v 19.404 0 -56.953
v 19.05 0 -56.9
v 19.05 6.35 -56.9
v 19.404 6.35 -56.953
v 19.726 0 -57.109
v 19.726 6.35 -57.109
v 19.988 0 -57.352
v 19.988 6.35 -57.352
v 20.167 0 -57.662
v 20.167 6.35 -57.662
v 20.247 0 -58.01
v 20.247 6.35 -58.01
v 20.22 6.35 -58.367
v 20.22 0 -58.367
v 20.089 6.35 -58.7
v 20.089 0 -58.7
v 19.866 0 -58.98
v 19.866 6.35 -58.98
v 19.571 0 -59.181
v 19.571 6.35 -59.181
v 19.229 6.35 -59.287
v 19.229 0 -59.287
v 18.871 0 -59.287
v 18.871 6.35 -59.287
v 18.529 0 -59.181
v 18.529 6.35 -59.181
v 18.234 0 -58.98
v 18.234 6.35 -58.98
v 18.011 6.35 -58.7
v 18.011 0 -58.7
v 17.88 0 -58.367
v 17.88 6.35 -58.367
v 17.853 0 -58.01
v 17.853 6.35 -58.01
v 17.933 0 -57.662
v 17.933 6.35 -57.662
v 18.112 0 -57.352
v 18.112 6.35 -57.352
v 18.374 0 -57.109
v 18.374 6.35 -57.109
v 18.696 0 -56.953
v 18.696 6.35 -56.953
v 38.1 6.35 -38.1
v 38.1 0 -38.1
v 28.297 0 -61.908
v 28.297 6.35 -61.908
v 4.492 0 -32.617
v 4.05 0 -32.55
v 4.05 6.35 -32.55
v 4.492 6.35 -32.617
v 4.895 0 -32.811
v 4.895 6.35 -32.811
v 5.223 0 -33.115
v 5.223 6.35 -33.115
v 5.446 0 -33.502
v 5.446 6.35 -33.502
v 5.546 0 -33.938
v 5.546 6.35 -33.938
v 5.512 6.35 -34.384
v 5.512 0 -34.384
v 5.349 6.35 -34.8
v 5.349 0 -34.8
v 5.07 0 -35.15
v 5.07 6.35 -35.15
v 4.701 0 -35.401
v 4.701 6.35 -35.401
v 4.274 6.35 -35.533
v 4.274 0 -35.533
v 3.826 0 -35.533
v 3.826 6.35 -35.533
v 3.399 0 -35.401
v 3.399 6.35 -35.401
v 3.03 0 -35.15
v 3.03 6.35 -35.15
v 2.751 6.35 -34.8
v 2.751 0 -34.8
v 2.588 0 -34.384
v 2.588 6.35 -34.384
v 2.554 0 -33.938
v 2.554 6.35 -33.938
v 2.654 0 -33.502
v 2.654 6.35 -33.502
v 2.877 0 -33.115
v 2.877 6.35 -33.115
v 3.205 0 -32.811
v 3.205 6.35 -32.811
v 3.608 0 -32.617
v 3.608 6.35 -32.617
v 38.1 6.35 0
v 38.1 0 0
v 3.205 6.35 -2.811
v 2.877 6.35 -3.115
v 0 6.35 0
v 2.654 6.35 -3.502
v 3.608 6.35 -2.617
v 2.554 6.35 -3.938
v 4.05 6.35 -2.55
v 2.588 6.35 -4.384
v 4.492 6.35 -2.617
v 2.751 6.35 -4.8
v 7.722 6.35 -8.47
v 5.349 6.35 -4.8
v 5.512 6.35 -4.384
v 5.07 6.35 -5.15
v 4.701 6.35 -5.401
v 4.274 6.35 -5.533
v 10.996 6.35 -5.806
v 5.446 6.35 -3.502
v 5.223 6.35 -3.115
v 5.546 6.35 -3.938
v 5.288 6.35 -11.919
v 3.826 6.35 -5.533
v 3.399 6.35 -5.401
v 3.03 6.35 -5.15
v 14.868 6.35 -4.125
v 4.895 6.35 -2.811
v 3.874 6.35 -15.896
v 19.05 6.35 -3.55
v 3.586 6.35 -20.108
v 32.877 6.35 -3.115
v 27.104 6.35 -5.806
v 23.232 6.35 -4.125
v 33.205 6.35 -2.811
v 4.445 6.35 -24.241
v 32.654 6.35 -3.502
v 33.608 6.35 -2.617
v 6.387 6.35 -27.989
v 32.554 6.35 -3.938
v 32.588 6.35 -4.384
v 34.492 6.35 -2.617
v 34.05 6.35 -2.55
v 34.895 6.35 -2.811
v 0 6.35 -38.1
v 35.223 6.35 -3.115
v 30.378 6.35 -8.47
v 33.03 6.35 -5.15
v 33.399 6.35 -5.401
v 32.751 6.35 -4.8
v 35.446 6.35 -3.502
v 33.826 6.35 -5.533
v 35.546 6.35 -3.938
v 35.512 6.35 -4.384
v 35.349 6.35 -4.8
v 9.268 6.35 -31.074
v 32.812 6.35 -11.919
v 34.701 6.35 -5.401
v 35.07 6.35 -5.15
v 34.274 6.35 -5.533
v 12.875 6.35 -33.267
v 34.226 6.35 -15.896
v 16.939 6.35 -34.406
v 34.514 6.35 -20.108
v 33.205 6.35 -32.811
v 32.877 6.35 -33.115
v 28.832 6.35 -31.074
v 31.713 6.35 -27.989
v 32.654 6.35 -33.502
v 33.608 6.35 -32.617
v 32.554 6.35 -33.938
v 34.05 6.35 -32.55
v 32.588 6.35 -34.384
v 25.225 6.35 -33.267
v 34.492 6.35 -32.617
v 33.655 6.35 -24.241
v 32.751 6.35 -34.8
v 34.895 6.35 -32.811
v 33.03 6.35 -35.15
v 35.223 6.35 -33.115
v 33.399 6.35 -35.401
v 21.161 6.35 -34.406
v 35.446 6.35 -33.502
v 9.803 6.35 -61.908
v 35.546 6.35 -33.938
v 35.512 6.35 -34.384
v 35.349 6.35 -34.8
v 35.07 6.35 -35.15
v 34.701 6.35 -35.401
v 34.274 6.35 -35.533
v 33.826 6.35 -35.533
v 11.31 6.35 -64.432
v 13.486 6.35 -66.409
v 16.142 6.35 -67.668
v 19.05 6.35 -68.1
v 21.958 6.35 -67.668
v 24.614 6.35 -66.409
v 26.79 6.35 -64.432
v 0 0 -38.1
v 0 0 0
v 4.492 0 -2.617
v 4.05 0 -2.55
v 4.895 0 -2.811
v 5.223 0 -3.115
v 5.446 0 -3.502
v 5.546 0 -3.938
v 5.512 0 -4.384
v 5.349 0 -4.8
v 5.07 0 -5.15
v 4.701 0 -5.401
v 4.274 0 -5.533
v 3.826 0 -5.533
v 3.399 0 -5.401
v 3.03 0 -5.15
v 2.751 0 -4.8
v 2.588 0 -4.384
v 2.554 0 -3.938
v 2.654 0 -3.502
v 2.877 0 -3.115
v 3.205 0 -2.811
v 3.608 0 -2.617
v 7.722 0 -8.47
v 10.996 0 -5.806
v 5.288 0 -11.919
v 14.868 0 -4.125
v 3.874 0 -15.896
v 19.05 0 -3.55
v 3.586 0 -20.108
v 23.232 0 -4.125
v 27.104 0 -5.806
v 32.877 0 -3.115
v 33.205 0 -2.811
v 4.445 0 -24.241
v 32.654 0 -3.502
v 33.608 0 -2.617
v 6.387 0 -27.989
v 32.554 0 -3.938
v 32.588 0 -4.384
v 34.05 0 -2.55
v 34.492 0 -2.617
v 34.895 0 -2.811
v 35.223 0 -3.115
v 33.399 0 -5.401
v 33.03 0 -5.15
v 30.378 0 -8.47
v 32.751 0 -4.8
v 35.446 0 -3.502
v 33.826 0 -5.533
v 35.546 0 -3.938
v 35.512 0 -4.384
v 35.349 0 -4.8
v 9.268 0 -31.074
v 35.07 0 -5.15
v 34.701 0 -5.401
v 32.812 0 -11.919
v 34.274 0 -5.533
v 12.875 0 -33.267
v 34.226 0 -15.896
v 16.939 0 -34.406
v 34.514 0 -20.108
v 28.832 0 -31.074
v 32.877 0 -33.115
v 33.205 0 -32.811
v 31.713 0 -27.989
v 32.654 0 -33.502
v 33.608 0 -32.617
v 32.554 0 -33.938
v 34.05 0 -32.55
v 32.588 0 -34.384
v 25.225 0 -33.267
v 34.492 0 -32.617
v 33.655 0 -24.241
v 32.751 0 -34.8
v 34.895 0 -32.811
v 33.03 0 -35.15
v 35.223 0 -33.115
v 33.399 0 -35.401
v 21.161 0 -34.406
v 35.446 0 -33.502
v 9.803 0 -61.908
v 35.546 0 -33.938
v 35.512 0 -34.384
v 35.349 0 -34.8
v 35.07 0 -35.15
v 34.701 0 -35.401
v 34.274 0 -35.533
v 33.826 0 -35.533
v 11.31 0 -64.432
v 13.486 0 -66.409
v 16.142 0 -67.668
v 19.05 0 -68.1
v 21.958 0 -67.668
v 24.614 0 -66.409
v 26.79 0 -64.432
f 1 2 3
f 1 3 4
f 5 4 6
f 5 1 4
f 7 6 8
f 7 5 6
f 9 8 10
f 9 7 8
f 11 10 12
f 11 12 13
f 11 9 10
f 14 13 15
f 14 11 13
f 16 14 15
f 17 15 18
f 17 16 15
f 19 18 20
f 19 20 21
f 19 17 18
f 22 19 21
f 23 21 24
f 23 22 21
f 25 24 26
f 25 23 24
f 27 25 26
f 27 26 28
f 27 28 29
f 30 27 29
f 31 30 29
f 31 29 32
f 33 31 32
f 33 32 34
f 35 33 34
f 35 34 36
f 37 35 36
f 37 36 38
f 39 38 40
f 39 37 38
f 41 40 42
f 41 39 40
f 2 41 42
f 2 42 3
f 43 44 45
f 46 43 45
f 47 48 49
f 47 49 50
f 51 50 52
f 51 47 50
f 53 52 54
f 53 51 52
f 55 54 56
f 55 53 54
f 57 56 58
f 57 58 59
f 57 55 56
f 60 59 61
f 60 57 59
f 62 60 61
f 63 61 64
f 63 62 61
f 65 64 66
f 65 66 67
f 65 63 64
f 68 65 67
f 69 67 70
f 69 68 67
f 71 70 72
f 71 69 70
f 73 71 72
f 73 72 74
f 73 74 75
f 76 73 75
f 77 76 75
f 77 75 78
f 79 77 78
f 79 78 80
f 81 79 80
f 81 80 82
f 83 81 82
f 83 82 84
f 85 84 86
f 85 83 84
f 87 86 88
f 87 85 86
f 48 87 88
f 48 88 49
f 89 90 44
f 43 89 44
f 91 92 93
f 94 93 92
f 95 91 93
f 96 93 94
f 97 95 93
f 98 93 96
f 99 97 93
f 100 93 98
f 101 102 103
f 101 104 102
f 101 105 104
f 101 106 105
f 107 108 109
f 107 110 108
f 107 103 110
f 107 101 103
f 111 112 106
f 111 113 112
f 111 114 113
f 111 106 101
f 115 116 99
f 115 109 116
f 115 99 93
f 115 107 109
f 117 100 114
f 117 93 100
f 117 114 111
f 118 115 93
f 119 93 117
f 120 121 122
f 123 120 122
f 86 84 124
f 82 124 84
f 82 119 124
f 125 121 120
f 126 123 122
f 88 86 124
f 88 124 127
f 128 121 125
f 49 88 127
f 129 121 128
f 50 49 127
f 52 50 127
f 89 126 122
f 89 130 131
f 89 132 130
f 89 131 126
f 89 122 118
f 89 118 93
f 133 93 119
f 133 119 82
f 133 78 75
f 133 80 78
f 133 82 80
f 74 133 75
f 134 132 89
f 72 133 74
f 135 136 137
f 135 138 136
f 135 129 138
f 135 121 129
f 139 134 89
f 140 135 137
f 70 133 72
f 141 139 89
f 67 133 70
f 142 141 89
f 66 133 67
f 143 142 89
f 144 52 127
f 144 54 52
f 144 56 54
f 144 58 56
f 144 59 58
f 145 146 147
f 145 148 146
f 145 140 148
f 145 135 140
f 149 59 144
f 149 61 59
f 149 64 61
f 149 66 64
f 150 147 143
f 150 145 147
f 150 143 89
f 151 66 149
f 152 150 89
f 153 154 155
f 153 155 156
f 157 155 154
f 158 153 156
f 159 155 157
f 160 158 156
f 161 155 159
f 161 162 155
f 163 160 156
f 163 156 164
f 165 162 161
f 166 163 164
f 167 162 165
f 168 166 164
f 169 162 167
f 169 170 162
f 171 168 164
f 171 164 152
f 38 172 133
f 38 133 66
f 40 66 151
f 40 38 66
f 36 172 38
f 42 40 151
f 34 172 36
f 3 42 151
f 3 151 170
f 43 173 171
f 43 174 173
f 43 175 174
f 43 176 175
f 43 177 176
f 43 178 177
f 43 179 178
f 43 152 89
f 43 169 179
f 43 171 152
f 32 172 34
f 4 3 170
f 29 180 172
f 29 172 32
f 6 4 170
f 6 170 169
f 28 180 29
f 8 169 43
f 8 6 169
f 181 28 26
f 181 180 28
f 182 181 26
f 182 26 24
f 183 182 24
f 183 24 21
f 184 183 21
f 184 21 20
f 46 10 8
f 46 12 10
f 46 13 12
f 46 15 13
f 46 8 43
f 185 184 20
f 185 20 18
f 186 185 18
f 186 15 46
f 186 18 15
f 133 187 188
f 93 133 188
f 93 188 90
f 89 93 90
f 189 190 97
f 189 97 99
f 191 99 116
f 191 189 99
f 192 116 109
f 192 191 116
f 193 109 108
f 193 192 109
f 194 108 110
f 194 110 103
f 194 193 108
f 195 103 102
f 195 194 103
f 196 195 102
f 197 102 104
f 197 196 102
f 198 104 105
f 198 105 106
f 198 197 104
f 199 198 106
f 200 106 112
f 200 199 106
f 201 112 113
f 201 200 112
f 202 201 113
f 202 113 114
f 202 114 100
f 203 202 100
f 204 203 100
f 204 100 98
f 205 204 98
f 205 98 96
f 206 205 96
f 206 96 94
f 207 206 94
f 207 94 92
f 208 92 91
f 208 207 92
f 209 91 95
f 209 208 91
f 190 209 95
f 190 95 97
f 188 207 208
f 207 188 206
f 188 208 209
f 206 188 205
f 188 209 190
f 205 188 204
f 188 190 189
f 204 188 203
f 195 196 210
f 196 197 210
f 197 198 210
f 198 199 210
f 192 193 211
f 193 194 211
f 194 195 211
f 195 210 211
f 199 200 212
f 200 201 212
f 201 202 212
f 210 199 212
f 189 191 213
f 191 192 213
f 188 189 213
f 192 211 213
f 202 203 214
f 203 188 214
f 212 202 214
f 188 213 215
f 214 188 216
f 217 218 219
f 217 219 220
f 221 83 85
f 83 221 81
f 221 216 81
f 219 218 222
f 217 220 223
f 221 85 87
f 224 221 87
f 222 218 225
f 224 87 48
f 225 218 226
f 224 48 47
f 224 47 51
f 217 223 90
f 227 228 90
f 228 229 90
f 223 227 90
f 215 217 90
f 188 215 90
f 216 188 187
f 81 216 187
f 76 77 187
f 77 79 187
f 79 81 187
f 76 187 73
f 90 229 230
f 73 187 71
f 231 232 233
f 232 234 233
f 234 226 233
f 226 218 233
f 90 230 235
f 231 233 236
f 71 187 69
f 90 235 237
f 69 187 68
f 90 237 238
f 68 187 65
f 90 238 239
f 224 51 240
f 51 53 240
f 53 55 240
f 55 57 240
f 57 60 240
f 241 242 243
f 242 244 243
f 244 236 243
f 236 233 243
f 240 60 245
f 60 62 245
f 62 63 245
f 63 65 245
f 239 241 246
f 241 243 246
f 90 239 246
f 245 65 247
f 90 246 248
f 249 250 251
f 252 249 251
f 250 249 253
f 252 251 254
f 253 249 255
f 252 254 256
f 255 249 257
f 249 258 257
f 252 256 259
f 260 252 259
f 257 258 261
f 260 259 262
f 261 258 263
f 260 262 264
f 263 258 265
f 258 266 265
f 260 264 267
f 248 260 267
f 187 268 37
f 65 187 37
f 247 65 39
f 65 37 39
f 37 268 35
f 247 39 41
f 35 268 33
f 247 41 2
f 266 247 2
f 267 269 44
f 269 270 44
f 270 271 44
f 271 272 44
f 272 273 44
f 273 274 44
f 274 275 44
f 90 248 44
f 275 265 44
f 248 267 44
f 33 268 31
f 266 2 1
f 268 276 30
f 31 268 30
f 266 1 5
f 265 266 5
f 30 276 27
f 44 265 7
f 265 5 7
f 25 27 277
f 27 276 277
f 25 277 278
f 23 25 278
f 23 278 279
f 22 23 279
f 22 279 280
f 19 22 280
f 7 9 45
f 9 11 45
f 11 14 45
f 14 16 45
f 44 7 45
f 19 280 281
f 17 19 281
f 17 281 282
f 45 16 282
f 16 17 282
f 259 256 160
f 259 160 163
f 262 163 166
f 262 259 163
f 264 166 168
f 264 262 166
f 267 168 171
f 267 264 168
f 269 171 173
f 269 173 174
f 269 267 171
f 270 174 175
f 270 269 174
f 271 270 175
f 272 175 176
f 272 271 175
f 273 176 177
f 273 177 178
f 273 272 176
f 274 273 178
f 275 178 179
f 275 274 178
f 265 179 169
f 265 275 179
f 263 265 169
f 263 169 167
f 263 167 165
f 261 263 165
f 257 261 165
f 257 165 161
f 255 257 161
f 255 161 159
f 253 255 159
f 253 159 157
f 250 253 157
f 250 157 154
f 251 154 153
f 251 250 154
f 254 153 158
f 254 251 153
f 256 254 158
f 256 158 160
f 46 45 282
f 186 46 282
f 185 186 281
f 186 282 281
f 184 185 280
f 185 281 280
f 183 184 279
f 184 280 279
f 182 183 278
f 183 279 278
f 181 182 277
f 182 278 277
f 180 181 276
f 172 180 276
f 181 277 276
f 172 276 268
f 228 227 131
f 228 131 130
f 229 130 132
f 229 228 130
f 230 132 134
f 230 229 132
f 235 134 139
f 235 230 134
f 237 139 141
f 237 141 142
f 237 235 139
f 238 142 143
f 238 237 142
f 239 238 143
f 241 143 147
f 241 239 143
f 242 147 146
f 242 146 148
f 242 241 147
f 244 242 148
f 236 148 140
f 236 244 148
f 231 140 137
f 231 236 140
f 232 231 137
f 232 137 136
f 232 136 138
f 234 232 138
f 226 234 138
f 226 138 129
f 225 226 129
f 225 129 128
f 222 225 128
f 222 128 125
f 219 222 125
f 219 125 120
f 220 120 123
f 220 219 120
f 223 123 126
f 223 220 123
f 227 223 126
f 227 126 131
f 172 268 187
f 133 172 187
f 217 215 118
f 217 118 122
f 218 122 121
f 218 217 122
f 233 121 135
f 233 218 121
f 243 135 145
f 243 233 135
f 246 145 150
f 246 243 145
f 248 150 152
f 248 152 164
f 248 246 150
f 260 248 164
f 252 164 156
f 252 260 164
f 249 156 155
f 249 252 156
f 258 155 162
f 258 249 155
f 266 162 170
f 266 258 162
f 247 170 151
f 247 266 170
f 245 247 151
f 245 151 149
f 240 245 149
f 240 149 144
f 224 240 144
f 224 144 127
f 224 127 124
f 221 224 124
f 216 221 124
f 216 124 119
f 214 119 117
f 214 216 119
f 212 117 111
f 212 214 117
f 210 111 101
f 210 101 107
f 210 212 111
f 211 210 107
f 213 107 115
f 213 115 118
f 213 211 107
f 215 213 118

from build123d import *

# Parameters (mm, degrees)
SKETCH1_R           = 1.5
SKETCH1_R_2         = 15.5
SKETCH1_R_3         = 1.2
BOSS_EXTRUDE1_DEPTH = 6.35


with BuildPart() as part:
    # Sketch1 → Boss-Extrude1 (new body)
    with BuildSketch(Plane(origin=(0, 0, 0), x_dir=(1, 0, 0), z_dir=(0, 1, 0))):
        with BuildLine():
            Line((0, 0), (38.1, 0))
            Line((38.1, 0), (38.1, 38.1))
            Line((38.1, 38.1), (28.296762992, 61.90754175))
            ThreePointArc((28.296762992, 61.90754175), (19.05, 68.1), (9.803237008, 61.90754175))
            Line((9.803237008, 61.90754175), (0, 38.1))
            Line((0, 38.1), (0, 0))
        make_face()
        with Locations(Location((4.05, 4.05, 0), (0, 0, 270))):
            Circle(SKETCH1_R, mode=Mode.SUBTRACT)
        with Locations(Location((34.05, 4.05, 0), (0, 0, 270))):
            Circle(SKETCH1_R, mode=Mode.SUBTRACT)
        with Locations(Location((34.05, 34.05, 0), (0, 0, 270))):
            Circle(SKETCH1_R, mode=Mode.SUBTRACT)
        with Locations(Location((4.05, 34.05, 0), (0, 0, 270))):
            Circle(SKETCH1_R, mode=Mode.SUBTRACT)
        with Locations(Location((19.05, 19.05, 0), (0, 0, 270))):
            Circle(SKETCH1_R_2, mode=Mode.SUBTRACT)
        with Locations(Location((19.05, 58.1, 0), (0, 0, 270))):
            Circle(SKETCH1_R_3, mode=Mode.SUBTRACT)
    extrude(amount=BOSS_EXTRUDE1_DEPTH)


solid = part.part
